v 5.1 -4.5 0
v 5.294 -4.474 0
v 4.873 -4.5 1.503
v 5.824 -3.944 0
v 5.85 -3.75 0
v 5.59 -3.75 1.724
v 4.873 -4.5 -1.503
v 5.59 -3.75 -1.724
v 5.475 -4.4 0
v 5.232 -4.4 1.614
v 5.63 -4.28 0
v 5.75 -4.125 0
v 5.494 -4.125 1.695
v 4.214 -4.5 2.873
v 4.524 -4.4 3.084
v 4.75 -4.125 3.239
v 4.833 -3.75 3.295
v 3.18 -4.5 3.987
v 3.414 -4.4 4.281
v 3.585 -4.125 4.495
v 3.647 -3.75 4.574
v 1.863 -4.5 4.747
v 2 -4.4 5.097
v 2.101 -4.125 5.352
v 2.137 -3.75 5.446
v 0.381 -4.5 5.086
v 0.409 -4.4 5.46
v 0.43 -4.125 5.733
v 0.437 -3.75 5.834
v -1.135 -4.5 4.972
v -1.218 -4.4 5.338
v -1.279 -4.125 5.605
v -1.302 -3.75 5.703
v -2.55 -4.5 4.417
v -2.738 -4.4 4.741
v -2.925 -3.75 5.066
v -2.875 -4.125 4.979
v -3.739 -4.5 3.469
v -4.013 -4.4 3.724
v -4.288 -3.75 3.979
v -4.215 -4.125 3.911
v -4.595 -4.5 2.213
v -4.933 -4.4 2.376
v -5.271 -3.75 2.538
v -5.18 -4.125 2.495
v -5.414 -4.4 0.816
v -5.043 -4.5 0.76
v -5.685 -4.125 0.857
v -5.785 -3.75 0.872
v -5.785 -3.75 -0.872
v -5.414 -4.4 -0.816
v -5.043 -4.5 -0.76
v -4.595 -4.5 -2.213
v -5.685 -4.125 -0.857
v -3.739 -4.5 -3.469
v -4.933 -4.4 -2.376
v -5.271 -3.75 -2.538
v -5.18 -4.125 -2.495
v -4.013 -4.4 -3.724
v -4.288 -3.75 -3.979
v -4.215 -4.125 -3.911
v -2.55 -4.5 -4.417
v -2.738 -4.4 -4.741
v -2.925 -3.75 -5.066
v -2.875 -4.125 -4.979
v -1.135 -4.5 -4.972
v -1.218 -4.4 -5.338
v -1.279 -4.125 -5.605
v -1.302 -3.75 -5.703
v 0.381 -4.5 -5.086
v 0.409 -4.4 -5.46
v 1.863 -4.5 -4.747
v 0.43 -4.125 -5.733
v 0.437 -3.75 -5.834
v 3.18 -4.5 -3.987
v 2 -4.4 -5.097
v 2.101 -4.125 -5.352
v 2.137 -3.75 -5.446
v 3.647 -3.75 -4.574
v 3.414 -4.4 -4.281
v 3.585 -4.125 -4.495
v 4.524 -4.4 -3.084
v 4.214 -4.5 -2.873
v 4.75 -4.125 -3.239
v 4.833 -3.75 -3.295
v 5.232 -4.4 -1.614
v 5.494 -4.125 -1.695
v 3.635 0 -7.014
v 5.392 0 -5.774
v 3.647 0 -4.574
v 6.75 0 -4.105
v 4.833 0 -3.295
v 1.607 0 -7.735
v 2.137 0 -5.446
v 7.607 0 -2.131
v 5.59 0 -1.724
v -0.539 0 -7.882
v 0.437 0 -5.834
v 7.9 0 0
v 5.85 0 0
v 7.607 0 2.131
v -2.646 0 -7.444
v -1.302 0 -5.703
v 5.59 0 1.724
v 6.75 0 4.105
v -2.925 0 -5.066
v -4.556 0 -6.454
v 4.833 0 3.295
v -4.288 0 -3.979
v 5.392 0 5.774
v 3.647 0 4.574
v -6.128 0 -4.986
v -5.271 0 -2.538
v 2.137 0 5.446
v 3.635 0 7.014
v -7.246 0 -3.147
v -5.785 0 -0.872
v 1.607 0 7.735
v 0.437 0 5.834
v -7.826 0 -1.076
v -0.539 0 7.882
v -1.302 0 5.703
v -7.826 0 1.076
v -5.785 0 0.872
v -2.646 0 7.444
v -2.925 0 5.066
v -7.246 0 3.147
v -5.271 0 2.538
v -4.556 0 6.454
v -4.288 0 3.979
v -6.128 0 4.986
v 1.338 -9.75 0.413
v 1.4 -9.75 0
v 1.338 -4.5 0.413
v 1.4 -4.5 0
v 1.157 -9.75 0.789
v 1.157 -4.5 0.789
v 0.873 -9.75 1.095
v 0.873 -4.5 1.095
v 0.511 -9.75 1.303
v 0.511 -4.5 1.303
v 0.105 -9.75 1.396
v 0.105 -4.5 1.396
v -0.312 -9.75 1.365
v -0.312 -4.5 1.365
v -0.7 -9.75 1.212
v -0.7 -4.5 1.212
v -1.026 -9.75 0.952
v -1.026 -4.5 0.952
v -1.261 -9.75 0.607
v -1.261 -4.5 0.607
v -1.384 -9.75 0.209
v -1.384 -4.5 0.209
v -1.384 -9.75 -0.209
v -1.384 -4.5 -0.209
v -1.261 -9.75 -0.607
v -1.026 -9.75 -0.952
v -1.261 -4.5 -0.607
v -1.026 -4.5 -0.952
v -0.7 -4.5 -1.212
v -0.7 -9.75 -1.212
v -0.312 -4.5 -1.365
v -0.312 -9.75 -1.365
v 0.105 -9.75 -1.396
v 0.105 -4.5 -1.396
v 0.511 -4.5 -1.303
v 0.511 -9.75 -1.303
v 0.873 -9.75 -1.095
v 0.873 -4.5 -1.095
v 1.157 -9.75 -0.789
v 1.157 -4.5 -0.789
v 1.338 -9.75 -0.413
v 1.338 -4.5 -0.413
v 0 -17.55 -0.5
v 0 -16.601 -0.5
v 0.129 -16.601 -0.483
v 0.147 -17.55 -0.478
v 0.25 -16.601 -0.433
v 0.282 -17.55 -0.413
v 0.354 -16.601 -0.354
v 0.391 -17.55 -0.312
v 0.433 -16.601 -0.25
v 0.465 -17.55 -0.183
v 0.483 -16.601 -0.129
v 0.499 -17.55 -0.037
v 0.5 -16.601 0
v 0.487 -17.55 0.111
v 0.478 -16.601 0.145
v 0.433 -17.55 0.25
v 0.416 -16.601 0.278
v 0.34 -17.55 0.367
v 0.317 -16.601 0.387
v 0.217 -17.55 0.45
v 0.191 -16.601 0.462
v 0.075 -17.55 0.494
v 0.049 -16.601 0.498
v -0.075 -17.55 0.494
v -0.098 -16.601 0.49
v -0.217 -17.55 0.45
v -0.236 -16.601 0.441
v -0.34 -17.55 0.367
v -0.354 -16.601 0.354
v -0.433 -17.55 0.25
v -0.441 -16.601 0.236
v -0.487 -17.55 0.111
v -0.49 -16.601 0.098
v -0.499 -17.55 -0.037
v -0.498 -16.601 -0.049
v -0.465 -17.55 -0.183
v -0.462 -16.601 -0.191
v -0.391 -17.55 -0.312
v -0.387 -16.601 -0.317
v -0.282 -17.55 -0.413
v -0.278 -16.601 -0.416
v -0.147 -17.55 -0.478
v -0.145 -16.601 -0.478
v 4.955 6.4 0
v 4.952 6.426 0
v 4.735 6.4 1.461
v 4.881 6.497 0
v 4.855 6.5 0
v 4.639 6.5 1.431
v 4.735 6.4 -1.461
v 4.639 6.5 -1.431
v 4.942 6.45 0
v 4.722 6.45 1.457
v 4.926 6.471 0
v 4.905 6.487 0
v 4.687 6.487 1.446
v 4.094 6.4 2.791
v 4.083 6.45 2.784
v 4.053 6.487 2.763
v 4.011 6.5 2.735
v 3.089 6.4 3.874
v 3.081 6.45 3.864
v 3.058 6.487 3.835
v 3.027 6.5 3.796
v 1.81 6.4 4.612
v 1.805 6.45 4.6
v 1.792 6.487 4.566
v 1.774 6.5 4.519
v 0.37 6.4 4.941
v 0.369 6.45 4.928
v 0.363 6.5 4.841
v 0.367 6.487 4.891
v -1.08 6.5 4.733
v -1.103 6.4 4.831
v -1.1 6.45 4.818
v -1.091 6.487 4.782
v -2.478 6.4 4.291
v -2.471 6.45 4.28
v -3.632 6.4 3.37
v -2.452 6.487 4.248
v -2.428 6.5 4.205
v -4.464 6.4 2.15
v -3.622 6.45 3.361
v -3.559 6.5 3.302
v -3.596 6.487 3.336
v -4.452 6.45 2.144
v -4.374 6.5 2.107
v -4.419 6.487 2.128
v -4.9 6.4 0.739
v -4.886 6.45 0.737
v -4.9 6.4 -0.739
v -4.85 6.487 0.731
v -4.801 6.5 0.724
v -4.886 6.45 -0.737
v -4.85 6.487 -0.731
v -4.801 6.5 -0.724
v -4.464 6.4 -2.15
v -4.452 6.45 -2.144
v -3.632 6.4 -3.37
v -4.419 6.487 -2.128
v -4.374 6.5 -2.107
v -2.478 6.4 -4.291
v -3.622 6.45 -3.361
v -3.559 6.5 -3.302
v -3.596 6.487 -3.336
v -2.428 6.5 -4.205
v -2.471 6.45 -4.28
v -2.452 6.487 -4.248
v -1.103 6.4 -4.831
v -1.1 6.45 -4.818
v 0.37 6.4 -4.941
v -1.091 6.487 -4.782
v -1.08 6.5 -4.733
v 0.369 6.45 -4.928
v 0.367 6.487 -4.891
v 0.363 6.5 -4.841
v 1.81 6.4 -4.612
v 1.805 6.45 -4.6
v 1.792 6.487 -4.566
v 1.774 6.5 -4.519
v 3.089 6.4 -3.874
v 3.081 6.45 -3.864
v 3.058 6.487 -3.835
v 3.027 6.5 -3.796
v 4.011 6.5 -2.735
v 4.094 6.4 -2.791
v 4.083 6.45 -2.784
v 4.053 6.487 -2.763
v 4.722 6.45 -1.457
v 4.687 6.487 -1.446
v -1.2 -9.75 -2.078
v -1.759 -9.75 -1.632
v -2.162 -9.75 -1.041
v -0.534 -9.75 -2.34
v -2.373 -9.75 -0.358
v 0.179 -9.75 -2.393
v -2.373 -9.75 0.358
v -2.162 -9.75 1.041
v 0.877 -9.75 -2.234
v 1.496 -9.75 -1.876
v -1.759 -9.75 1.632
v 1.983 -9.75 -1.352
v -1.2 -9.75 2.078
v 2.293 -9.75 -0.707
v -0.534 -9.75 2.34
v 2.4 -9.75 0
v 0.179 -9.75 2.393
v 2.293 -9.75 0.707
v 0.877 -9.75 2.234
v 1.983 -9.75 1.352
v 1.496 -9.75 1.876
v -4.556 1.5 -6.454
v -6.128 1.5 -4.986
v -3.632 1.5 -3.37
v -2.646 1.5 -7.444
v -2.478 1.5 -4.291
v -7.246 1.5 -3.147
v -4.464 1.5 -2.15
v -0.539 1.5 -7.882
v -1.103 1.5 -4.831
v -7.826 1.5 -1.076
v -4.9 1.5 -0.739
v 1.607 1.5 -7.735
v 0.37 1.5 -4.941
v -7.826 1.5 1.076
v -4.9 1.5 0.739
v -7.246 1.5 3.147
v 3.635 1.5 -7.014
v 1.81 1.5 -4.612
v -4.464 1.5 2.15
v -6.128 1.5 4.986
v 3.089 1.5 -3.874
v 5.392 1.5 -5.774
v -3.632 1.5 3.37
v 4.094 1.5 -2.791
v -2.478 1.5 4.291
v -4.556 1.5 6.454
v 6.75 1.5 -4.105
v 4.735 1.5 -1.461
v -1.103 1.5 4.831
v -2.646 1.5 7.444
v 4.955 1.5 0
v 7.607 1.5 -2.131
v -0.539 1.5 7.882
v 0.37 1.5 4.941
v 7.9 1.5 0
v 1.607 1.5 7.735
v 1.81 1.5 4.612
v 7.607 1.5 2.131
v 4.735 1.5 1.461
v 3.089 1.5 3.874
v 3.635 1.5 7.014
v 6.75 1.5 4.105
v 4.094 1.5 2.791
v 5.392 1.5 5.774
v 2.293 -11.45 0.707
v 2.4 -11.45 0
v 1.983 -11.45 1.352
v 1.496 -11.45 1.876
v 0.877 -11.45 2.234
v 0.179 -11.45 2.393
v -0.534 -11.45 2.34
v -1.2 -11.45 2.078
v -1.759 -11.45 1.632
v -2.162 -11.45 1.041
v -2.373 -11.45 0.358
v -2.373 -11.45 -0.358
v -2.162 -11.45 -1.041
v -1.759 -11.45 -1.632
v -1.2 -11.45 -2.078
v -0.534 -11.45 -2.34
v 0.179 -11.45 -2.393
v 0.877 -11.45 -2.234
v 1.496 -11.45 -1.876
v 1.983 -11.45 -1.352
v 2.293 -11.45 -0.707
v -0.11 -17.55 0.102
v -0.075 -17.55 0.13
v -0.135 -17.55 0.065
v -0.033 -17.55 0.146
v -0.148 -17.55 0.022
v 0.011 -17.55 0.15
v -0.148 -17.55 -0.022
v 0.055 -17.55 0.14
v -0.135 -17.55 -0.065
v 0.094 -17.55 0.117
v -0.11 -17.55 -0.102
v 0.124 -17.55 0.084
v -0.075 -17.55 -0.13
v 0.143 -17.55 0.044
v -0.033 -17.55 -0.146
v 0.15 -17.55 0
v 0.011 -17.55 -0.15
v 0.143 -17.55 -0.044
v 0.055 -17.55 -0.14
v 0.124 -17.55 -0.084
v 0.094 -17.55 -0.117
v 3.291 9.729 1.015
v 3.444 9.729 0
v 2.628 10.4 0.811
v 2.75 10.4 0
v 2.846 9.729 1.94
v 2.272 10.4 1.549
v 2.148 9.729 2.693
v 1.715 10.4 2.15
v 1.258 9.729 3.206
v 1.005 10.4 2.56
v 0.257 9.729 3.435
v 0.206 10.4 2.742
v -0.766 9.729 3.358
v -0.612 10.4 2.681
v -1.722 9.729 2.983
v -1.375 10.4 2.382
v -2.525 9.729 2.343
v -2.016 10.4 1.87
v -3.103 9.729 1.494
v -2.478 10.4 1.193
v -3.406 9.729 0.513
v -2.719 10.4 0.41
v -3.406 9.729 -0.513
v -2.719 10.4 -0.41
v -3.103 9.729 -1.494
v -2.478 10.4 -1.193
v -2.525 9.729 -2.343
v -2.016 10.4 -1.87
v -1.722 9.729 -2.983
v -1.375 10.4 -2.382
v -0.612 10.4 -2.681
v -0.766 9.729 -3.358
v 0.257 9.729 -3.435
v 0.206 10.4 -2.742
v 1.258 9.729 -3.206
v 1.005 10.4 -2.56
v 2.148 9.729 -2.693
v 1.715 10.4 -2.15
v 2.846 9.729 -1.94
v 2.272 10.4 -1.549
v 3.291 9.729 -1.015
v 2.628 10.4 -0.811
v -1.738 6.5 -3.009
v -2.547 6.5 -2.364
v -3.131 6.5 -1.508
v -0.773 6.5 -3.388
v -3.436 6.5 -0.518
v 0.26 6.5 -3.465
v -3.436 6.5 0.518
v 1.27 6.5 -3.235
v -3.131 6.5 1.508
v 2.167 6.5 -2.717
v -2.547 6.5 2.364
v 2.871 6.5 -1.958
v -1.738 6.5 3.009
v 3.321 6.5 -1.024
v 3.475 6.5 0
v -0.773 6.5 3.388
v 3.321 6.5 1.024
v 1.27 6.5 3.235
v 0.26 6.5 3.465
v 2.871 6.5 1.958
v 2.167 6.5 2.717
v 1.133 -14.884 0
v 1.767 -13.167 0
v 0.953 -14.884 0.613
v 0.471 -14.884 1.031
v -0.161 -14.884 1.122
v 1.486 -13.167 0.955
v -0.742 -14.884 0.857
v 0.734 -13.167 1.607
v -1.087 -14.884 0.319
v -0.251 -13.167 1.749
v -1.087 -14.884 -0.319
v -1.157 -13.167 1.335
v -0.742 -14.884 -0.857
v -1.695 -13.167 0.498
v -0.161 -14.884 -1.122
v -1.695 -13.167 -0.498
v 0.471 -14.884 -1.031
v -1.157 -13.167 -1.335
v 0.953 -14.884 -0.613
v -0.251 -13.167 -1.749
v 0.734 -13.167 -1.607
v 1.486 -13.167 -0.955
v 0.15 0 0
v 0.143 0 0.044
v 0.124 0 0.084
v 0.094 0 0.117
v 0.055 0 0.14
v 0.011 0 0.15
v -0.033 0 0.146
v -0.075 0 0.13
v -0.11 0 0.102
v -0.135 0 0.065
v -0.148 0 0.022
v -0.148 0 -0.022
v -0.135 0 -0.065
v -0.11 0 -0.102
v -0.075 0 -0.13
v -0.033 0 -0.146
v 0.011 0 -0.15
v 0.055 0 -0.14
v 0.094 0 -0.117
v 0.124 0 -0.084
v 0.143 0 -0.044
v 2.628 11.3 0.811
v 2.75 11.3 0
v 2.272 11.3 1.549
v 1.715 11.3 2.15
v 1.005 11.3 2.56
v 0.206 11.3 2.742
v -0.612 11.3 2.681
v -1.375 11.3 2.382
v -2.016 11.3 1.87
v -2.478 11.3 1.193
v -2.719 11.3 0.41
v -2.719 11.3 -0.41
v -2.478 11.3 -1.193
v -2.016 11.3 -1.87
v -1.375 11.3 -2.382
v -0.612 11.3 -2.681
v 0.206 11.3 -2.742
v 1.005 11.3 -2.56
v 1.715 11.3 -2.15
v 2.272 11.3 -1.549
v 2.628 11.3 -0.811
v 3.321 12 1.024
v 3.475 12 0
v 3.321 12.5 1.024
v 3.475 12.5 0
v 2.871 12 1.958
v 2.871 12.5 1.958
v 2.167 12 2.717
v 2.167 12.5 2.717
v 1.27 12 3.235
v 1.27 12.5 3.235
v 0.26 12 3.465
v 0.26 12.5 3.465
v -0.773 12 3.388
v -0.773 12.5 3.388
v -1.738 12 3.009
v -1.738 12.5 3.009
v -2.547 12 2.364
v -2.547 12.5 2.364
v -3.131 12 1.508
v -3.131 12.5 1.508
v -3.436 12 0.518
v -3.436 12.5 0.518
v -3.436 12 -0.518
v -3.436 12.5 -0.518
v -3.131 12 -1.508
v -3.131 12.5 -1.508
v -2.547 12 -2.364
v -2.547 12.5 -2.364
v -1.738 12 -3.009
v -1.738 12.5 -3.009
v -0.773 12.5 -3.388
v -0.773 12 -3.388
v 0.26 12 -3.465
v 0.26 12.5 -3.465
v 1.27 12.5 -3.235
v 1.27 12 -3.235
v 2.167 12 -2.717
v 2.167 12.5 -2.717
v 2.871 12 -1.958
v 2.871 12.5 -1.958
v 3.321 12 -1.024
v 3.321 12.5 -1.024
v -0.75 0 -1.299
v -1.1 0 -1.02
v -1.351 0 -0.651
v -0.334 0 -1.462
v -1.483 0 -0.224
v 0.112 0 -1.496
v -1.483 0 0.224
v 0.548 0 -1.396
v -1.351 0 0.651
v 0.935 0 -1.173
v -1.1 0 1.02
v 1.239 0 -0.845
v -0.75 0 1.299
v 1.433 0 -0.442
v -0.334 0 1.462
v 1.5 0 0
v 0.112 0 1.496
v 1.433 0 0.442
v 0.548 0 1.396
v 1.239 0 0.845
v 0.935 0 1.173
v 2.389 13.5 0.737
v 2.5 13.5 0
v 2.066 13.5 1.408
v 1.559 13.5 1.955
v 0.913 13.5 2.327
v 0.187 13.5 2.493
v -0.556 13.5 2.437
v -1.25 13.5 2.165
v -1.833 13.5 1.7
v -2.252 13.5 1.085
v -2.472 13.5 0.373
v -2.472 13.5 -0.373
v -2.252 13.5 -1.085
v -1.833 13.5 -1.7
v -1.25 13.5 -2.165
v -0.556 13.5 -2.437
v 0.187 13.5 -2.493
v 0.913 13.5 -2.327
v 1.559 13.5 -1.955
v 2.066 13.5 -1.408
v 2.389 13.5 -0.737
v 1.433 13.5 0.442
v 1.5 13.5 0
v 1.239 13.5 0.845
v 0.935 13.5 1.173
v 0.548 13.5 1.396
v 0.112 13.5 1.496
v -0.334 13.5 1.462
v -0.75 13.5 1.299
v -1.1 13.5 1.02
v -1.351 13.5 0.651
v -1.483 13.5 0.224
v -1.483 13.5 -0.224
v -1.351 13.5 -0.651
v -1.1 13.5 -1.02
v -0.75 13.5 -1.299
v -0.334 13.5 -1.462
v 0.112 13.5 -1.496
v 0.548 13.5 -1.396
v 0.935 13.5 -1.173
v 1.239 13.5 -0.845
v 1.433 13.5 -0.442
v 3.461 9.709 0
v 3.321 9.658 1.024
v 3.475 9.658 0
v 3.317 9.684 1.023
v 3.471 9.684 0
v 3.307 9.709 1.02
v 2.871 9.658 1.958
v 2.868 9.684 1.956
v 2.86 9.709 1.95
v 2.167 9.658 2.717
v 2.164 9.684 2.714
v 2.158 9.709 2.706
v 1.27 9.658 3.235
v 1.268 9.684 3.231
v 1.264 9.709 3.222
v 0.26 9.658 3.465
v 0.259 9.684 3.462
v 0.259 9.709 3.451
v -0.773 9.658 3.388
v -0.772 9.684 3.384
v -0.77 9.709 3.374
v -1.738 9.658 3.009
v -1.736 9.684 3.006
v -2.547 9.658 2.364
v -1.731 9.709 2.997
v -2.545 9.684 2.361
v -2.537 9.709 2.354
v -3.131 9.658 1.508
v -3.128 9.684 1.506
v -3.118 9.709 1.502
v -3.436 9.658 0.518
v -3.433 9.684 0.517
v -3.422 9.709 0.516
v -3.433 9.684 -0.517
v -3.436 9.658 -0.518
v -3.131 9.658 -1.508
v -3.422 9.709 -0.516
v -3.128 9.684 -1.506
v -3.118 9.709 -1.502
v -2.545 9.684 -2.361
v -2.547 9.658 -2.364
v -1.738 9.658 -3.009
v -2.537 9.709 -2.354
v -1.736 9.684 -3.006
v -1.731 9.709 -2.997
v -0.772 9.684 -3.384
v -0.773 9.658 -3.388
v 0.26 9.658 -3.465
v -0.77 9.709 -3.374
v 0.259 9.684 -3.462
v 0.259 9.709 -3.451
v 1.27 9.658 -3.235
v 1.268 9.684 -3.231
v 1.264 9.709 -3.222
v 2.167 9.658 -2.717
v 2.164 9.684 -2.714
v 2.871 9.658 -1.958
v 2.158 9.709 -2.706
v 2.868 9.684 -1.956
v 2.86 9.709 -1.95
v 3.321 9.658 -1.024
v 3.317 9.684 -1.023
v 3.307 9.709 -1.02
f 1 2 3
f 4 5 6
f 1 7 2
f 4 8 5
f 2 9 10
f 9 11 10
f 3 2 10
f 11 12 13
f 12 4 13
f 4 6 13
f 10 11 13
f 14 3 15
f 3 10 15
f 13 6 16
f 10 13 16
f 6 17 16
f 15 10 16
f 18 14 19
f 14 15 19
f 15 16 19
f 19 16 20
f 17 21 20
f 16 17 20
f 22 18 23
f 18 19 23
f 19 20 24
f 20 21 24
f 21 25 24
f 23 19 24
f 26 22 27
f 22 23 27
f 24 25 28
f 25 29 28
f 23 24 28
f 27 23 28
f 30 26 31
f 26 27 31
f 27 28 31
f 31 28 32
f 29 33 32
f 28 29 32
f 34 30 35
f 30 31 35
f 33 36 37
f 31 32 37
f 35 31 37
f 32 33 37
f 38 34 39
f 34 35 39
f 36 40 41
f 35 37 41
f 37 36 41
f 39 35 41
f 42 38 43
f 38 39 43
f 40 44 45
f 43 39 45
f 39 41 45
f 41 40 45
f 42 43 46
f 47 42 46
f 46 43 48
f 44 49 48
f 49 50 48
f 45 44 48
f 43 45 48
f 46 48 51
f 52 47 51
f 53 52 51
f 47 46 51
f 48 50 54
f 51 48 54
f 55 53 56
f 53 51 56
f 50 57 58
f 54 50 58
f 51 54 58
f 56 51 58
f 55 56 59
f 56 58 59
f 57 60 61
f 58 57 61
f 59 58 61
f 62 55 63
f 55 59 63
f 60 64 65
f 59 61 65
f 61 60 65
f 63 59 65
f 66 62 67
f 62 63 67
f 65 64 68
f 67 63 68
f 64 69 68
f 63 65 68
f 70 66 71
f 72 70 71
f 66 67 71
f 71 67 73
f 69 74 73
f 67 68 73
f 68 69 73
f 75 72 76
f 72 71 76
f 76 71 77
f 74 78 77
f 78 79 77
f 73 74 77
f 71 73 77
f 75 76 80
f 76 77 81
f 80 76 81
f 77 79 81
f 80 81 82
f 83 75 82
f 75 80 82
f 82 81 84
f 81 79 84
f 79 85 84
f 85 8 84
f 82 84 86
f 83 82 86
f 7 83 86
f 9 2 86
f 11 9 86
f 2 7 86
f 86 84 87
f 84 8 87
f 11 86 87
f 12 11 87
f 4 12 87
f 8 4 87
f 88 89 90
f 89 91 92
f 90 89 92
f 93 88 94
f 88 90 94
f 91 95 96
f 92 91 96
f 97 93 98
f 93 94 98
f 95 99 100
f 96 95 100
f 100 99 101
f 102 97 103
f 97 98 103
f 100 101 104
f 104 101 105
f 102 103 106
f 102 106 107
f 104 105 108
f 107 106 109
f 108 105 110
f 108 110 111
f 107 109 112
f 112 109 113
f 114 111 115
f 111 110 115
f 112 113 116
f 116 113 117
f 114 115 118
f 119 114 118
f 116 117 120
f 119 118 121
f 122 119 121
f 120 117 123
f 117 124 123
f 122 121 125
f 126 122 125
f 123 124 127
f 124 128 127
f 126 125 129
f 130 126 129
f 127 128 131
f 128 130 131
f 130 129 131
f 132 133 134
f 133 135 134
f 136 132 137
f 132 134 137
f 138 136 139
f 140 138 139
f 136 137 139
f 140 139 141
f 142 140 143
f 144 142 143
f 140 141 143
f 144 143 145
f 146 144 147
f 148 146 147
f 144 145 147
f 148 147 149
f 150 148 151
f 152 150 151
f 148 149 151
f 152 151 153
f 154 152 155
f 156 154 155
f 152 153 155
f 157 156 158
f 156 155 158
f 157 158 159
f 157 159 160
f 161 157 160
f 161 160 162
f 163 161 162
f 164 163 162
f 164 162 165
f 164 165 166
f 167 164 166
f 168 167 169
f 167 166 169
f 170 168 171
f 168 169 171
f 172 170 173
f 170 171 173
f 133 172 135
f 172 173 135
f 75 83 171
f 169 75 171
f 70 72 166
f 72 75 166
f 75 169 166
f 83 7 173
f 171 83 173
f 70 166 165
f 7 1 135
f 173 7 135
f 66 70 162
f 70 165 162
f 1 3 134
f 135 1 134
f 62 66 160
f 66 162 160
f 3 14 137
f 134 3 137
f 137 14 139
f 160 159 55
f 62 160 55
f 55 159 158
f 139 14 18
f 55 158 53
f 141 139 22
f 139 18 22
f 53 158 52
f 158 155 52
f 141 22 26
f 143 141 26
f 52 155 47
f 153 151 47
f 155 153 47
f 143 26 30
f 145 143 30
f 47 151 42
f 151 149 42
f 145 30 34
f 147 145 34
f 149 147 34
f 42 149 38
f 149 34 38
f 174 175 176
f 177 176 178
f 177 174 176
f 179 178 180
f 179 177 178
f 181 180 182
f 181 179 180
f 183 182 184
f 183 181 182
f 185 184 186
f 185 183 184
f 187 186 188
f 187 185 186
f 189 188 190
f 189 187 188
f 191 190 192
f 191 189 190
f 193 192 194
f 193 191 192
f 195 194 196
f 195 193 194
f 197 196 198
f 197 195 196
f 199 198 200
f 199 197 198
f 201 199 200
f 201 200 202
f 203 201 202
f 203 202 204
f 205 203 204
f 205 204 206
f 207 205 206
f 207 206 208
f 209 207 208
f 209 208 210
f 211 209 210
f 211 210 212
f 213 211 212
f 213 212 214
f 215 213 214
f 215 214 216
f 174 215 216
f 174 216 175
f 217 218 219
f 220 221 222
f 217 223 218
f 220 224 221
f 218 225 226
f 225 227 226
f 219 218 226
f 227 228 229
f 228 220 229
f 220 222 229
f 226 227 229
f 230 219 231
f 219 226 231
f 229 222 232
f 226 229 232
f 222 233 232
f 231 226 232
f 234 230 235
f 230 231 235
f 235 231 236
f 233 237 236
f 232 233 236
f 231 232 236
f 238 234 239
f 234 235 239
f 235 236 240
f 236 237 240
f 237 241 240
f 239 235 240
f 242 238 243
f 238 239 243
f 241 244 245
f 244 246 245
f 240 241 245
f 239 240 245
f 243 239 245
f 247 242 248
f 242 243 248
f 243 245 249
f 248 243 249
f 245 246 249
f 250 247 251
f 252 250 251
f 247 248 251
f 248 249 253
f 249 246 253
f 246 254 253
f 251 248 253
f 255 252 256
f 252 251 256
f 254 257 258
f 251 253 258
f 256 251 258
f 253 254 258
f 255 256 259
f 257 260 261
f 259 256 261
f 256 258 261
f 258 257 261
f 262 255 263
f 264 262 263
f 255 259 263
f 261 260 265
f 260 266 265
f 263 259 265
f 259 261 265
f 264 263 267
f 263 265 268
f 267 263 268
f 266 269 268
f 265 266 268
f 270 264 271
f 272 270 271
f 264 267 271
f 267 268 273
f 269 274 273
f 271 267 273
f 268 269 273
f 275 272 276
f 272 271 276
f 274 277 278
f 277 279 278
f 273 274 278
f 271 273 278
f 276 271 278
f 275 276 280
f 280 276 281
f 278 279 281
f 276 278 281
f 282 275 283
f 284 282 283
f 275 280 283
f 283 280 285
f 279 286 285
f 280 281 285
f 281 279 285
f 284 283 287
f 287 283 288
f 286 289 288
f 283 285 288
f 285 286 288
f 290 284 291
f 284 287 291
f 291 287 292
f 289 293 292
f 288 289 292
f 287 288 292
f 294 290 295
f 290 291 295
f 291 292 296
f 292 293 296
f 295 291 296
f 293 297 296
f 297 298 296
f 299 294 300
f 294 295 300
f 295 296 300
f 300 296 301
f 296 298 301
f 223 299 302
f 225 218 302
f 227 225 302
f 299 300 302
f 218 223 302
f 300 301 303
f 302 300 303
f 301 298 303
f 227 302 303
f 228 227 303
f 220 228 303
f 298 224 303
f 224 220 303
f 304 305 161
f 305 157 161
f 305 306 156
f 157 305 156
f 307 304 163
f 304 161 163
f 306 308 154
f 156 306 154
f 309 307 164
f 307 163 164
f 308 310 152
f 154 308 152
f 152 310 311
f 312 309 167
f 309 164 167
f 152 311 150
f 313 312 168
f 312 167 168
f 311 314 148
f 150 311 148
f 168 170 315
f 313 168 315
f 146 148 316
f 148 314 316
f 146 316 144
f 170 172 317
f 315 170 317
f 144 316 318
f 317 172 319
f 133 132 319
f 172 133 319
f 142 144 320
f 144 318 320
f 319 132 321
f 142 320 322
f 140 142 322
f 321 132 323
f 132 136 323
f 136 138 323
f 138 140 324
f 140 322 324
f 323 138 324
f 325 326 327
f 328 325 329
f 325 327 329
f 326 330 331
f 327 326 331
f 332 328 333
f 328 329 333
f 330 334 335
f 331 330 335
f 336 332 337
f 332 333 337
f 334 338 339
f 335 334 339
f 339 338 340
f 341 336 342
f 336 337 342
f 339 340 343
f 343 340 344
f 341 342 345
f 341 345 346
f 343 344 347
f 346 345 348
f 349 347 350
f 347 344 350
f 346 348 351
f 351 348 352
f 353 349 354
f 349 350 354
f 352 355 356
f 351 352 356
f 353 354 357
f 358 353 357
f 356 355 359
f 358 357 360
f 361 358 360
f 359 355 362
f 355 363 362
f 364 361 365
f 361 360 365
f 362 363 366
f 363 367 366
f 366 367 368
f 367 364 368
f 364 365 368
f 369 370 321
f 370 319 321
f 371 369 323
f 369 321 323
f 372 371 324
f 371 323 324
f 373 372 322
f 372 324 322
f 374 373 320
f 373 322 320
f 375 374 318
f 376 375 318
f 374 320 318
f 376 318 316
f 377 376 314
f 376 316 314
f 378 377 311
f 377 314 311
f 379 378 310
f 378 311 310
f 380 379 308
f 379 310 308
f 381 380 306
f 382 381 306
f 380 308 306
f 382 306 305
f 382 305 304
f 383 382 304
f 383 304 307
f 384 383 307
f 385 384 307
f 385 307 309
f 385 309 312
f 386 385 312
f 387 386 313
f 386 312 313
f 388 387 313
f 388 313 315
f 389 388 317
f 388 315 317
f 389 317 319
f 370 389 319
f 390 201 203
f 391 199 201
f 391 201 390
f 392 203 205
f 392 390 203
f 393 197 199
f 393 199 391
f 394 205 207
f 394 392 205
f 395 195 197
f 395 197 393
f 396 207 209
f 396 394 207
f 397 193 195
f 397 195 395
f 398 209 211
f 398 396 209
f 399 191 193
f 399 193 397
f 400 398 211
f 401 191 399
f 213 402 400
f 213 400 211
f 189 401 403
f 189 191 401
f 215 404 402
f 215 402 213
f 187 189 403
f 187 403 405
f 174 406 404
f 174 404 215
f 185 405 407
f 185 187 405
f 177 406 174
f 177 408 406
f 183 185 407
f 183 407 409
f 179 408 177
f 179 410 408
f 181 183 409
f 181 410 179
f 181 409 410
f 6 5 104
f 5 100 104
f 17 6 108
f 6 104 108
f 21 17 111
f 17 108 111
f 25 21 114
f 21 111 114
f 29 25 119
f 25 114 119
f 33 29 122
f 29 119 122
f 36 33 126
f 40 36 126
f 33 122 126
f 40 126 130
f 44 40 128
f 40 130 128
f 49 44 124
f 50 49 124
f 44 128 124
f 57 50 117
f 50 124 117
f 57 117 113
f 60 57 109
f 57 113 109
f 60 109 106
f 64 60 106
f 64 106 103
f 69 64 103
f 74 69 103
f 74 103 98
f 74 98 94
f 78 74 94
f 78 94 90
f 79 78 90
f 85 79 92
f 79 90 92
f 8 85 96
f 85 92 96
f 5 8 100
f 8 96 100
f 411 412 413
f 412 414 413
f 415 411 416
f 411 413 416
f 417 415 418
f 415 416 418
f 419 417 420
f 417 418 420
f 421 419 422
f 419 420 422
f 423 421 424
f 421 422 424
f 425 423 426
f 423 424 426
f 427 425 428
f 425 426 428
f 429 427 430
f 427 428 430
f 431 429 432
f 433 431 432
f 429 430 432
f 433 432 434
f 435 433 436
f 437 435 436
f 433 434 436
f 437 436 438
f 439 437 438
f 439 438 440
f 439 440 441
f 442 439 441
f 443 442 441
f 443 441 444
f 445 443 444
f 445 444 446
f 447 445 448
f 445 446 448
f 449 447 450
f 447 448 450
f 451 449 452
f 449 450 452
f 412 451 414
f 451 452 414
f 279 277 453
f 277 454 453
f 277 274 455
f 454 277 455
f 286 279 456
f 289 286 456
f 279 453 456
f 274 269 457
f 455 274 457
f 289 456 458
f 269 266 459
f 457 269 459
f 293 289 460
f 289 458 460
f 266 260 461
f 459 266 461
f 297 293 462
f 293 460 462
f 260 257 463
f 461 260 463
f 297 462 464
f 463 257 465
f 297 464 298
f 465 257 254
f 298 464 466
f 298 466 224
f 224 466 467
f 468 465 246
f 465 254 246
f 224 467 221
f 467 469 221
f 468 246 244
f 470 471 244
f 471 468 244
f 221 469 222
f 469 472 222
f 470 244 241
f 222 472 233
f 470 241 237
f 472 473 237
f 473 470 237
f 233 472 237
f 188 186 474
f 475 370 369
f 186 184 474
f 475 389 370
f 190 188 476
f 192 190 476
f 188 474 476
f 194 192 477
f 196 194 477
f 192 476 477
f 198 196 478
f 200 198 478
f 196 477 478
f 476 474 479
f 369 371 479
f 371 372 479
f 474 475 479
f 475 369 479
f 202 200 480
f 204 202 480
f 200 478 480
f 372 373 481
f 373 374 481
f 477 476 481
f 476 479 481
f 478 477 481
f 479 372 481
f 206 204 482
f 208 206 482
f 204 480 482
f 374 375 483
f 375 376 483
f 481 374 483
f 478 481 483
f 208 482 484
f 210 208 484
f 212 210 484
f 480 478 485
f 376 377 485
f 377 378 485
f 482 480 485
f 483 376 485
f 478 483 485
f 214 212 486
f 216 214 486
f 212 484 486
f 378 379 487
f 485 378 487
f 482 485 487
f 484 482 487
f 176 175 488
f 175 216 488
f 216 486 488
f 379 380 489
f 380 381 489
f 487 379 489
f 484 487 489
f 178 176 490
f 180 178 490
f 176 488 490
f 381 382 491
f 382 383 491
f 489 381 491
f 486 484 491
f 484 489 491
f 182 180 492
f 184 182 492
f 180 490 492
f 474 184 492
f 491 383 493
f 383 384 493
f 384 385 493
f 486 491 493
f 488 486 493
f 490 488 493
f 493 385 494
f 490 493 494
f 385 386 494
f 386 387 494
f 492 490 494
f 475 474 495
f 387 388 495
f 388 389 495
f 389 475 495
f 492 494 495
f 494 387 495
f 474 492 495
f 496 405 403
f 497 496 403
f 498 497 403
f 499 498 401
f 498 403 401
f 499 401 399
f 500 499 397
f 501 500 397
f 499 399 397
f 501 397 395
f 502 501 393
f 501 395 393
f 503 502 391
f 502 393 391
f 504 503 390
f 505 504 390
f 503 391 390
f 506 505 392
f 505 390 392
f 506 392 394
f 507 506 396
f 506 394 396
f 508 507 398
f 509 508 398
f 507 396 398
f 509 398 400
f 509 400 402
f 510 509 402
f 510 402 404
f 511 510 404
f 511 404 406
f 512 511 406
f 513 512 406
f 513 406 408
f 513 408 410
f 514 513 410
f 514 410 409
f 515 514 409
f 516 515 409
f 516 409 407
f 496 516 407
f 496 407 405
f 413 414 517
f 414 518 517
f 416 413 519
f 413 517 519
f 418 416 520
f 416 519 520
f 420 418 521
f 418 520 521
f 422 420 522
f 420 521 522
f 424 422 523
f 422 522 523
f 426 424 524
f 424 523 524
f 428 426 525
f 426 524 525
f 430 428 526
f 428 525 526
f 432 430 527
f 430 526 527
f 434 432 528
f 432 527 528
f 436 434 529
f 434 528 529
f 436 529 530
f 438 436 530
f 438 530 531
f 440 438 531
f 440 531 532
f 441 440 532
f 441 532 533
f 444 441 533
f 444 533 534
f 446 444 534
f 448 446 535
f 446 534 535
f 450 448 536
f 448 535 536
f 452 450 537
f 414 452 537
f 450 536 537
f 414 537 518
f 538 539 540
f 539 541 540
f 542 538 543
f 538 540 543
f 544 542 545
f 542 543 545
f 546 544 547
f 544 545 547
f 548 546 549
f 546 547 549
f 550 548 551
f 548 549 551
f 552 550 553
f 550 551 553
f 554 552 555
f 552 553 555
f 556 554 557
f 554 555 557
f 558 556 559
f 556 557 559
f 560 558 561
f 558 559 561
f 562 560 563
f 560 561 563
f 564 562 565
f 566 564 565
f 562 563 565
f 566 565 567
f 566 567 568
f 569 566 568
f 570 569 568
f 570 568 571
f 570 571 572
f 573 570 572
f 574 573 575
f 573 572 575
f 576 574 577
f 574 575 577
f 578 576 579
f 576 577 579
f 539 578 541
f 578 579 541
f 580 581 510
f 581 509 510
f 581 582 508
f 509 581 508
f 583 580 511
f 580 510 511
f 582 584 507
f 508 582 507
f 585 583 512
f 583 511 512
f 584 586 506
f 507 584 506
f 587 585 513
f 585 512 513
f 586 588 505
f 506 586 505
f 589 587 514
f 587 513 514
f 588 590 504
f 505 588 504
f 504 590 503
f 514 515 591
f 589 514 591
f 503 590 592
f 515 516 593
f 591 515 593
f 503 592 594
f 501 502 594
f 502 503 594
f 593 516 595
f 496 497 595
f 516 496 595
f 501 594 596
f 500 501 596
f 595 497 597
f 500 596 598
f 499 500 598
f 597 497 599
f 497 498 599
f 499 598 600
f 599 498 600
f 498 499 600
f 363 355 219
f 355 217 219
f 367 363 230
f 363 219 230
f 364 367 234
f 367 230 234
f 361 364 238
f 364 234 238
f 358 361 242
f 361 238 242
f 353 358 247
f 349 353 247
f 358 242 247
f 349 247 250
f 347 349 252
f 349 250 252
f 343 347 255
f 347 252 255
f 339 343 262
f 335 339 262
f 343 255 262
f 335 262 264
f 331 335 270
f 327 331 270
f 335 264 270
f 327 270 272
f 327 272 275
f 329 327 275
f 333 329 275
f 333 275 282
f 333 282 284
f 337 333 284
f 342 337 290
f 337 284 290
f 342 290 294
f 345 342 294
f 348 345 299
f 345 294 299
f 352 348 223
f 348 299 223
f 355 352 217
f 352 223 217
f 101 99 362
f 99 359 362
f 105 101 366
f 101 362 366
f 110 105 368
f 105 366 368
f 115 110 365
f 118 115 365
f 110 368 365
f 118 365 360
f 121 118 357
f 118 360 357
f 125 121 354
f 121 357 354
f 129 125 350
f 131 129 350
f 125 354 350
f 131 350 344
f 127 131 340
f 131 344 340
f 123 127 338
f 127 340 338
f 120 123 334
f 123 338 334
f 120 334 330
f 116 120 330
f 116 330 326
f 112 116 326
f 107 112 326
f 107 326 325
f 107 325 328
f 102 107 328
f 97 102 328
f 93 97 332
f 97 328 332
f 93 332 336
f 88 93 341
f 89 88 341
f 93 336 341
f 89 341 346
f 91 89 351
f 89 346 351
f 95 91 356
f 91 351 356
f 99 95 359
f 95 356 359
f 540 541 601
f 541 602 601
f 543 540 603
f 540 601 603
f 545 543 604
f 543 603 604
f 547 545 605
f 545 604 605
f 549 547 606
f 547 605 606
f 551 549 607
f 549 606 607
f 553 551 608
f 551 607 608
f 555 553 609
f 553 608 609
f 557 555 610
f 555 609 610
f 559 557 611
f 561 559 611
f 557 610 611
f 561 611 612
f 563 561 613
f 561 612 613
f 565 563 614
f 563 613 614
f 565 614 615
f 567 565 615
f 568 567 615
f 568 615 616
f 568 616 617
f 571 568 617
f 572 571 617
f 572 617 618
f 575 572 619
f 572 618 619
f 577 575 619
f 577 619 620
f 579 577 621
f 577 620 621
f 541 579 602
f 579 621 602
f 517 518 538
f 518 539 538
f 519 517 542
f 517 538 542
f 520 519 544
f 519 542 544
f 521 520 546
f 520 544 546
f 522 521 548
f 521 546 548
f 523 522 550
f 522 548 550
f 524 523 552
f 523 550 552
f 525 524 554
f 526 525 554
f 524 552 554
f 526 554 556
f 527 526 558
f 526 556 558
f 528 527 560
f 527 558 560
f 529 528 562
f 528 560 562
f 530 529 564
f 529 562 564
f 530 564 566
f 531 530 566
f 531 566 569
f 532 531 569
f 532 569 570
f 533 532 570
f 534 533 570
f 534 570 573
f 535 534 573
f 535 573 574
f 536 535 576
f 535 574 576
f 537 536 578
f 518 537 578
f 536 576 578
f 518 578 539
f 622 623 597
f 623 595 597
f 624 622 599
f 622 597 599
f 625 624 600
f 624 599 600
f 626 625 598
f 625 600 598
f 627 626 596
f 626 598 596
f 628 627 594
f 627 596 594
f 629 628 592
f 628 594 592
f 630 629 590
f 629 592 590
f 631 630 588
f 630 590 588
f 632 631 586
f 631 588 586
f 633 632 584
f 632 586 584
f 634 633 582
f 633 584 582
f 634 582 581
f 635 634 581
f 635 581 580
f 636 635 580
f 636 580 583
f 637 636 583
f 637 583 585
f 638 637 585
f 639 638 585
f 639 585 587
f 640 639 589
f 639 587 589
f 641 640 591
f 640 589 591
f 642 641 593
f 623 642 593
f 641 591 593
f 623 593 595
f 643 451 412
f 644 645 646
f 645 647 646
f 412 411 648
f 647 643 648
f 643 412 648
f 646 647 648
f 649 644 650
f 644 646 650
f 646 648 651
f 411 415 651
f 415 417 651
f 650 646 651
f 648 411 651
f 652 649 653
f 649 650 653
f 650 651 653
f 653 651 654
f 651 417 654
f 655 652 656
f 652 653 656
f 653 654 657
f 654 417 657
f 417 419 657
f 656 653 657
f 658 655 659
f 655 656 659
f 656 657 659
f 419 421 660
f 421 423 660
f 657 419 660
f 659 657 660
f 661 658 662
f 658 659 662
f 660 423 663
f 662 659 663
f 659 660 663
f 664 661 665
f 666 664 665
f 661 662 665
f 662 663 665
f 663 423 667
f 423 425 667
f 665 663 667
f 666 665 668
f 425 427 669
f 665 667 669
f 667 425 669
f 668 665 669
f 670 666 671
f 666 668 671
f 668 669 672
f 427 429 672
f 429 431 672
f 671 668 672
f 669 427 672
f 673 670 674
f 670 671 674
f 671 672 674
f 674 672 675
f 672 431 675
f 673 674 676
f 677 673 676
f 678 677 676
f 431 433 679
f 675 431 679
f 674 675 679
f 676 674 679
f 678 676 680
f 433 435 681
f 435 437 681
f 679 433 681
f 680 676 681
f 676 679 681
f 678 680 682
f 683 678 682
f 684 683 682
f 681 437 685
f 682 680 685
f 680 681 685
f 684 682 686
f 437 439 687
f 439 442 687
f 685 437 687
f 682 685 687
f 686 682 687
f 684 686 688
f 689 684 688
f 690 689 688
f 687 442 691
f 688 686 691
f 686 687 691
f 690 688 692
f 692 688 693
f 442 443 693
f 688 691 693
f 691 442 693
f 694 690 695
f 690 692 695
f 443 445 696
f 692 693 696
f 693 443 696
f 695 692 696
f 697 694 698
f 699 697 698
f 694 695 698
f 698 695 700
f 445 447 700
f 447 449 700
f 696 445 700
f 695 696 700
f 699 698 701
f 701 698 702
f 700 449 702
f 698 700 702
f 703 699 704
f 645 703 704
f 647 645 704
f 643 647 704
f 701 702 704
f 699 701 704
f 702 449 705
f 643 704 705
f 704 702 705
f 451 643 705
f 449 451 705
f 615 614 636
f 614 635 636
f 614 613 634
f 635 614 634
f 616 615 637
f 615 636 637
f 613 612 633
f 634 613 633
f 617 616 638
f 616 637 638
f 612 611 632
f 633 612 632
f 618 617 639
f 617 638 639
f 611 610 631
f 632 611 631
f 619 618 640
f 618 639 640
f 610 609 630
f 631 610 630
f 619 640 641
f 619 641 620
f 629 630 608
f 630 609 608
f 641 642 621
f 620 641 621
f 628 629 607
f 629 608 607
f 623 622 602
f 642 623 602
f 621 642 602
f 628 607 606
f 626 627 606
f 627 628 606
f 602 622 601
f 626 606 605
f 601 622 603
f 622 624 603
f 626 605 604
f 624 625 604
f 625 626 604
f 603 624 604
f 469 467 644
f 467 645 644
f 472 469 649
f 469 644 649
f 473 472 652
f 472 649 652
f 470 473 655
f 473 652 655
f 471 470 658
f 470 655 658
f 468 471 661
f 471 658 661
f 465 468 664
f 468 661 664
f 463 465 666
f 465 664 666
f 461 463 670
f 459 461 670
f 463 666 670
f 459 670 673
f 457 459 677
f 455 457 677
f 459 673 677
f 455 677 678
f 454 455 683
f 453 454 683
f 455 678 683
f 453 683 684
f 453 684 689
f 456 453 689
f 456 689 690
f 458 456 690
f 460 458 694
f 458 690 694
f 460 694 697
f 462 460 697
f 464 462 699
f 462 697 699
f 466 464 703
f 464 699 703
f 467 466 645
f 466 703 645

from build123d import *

# Parameters (mm, degrees)
SKETCH_2_R      = 0.5
SKETCH_2_R_2    = 0.15
EXTRUDE_1_DEPTH = 1


with BuildPart() as part:
    # 草图1 → 旋转1 (revolve)
    with BuildSketch(Plane.XY):
        with BuildLine():
            Line((2.4, -9.75), (1.4, -9.75))
            Line((1.4, -9.75), (1.4, -4.5))
            Line((1.4, -4.5), (5.1, -4.5))
            ThreePointArc((5.1, -4.5), (5.630330086, -4.280330086), (5.85, -3.75))
            Line((5.85, -3.75), (5.85, 0))
            Line((5.85, 0), (7.9, 0))
            Line((7.9, 0), (7.9, 1.5))
            Line((7.9, 1.5), (4.955, 1.5))
            Line((4.955, 1.5), (4.955, 6.4))
            ThreePointArc((4.955, 6.4), (4.925710678, 6.470710678), (4.855, 6.5))
            Line((4.855, 6.5), (3.475, 6.5))
            Line((3.475, 6.5), (3.475, 9.65754728))
            ThreePointArc((3.475, 9.65754728), (3.467048751, 9.696624479), (3.444459451, 9.729487426))
            Line((3.444459451, 9.729487426), (2.75, 10.4))
            Line((2.75, 10.4), (2.75, 11.3))
            Line((2.75, 11.3), (3.475, 12))
            Line((3.475, 12), (3.475, 12.5))
            Line((3.475, 12.5), (2.5, 13.5))
            Line((2.5, 13.5), (1.5, 13.5))
            Line((1.5, 13.5), (1.5, 0))
            Line((1.5, 0), (0.15, 0))
            Line((0.15, 0), (0.15, -17.55))
            Line((0.15, -17.55), (2.4, -11.45))
            Line((2.4, -11.45), (2.4, -9.75))
        make_face()
    revolve(axis=Axis((0, 13.5, 0), (0, -1, 0)))

    # 草图2 → 凸台-拉伸1 (add)
    with BuildSketch(Plane(origin=(0, -17.55, 0), x_dir=(-1, 0, 0), z_dir=(0, -1, 0))):
        Circle(SKETCH_2_R)
        Circle(SKETCH_2_R_2, mode=Mode.SUBTRACT)
    extrude(amount=-EXTRUDE_1_DEPTH)


solid = part.part
